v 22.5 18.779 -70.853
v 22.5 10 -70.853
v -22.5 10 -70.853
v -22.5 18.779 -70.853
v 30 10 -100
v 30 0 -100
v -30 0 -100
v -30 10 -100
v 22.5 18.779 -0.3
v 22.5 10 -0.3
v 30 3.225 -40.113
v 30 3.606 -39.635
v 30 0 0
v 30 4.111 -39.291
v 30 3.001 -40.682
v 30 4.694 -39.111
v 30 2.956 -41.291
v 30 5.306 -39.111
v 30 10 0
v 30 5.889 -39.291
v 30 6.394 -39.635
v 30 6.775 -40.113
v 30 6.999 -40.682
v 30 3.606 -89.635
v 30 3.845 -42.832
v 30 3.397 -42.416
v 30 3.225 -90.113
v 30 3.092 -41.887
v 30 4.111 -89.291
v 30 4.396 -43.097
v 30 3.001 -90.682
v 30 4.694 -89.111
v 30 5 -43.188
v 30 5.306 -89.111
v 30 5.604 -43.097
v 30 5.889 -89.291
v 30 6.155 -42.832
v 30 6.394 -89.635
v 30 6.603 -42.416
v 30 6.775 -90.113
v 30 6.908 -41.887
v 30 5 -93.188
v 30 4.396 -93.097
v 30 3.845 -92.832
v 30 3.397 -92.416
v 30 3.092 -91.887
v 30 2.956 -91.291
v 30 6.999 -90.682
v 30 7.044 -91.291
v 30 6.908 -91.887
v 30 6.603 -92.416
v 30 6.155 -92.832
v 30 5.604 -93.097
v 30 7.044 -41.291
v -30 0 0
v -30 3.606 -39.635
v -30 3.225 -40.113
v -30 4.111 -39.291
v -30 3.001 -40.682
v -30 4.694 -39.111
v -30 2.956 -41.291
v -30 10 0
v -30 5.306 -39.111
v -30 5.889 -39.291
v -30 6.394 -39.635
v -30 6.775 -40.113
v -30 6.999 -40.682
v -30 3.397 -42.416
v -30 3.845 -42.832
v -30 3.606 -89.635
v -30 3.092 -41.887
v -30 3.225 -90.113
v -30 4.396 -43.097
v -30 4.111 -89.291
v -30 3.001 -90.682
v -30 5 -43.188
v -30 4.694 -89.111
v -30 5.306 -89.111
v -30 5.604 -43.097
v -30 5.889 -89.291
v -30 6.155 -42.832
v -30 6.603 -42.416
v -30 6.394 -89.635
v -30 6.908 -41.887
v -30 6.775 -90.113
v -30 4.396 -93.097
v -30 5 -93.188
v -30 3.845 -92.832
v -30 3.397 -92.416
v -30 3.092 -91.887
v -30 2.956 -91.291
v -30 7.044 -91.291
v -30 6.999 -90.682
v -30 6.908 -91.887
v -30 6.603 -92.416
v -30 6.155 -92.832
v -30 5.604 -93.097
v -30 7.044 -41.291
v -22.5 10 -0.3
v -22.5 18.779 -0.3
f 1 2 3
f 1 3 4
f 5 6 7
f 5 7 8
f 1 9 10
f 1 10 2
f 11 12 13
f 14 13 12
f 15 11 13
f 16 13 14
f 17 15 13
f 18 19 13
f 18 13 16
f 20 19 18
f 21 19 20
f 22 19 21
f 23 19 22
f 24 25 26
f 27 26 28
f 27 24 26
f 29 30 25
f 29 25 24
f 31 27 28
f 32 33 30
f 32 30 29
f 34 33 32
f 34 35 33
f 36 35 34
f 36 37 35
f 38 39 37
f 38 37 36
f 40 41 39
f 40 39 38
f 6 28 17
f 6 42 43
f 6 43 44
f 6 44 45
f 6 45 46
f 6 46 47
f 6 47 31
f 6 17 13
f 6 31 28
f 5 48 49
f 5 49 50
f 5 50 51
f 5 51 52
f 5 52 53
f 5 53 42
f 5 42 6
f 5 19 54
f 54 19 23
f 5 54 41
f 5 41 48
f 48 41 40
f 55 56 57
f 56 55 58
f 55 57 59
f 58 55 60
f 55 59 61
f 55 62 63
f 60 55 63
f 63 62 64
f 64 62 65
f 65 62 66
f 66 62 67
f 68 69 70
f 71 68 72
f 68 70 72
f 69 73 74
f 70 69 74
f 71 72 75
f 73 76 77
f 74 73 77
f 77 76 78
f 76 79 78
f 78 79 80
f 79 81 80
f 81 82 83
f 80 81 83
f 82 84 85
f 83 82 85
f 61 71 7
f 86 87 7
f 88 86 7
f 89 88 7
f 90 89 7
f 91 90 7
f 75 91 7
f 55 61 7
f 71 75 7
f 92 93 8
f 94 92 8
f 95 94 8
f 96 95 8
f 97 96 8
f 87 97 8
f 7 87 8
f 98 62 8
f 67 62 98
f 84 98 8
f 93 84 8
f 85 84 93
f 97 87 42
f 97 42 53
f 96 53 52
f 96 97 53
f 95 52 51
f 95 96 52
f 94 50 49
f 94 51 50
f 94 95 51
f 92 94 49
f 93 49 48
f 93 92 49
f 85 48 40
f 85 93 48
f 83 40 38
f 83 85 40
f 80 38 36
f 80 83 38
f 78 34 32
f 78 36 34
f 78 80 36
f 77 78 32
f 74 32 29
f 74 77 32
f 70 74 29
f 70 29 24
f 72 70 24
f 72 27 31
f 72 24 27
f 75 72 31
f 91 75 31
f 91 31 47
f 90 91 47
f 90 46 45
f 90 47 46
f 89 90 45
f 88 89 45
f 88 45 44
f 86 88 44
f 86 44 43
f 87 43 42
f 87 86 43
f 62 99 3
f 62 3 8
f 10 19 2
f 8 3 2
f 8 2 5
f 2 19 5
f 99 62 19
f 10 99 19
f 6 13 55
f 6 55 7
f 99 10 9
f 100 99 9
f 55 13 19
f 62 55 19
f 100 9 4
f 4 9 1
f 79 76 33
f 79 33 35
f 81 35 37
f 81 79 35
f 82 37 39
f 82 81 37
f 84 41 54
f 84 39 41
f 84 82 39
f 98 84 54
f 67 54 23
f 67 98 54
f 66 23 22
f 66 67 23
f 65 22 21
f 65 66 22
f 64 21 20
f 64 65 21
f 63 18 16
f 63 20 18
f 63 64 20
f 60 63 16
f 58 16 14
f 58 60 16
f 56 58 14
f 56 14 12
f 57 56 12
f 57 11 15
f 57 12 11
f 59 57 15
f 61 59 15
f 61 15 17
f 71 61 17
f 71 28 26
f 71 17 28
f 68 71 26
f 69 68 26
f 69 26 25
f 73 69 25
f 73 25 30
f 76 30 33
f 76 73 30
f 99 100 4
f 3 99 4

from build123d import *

# Parameters (mm, degrees)
SKETCH_1_W               = 100
SKETCH_1_H               = 10
EXTRUDE_1_DEPTH          = 30
CUT_EXTRUDE_1_DEPTH      = 105.880884817
CUT_EXTRUDE_1_DEPTH_BACK = 105.880884817
SKETCH_2_R               = 2.05
SKETCH_4_W               = 70.552340153
SKETCH_4_H               = 8.779398974
EXTRUDE_2_DEPTH          = 22.5


with BuildPart() as part:
    # 스케치1 → 보스-돌출1 (new, symmetric)
    with BuildSketch(Plane(origin=(0, 0, 0), x_dir=(0, 0, -1), z_dir=(1, 0, 0))):
        with Locations((50, 5)):
            Rectangle(SKETCH_1_W, SKETCH_1_H)
    extrude(amount=EXTRUDE_1_DEPTH, both=True)

    # 스케치2 → 컷-돌출1 (cut, two sides: drawn at the far end of the back side and taken through both)
    with BuildSketch(Plane(origin=(0, 0, 0), x_dir=(0, 0, -1), z_dir=(1, 0, 0)).offset(-CUT_EXTRUDE_1_DEPTH_BACK)):
        with Locations((41.137955169, 5)):
            Circle(SKETCH_2_R)
        with Locations((91.137955169, 5)):
            Circle(SKETCH_2_R)
    extrude(amount=CUT_EXTRUDE_1_DEPTH + CUT_EXTRUDE_1_DEPTH_BACK, mode=Mode.SUBTRACT)

    # 스케치4 → 보스-돌출2 (add, symmetric)
    with BuildSketch(Plane(origin=(0, 0, 0), x_dir=(0, 0, -1), z_dir=(1, 0, 0))):
        with Locations((35.576558904, 14.389699487)):
            Rectangle(SKETCH_4_W, SKETCH_4_H)
    extrude(amount=EXTRUDE_2_DEPTH, both=True)


solid = part.part
